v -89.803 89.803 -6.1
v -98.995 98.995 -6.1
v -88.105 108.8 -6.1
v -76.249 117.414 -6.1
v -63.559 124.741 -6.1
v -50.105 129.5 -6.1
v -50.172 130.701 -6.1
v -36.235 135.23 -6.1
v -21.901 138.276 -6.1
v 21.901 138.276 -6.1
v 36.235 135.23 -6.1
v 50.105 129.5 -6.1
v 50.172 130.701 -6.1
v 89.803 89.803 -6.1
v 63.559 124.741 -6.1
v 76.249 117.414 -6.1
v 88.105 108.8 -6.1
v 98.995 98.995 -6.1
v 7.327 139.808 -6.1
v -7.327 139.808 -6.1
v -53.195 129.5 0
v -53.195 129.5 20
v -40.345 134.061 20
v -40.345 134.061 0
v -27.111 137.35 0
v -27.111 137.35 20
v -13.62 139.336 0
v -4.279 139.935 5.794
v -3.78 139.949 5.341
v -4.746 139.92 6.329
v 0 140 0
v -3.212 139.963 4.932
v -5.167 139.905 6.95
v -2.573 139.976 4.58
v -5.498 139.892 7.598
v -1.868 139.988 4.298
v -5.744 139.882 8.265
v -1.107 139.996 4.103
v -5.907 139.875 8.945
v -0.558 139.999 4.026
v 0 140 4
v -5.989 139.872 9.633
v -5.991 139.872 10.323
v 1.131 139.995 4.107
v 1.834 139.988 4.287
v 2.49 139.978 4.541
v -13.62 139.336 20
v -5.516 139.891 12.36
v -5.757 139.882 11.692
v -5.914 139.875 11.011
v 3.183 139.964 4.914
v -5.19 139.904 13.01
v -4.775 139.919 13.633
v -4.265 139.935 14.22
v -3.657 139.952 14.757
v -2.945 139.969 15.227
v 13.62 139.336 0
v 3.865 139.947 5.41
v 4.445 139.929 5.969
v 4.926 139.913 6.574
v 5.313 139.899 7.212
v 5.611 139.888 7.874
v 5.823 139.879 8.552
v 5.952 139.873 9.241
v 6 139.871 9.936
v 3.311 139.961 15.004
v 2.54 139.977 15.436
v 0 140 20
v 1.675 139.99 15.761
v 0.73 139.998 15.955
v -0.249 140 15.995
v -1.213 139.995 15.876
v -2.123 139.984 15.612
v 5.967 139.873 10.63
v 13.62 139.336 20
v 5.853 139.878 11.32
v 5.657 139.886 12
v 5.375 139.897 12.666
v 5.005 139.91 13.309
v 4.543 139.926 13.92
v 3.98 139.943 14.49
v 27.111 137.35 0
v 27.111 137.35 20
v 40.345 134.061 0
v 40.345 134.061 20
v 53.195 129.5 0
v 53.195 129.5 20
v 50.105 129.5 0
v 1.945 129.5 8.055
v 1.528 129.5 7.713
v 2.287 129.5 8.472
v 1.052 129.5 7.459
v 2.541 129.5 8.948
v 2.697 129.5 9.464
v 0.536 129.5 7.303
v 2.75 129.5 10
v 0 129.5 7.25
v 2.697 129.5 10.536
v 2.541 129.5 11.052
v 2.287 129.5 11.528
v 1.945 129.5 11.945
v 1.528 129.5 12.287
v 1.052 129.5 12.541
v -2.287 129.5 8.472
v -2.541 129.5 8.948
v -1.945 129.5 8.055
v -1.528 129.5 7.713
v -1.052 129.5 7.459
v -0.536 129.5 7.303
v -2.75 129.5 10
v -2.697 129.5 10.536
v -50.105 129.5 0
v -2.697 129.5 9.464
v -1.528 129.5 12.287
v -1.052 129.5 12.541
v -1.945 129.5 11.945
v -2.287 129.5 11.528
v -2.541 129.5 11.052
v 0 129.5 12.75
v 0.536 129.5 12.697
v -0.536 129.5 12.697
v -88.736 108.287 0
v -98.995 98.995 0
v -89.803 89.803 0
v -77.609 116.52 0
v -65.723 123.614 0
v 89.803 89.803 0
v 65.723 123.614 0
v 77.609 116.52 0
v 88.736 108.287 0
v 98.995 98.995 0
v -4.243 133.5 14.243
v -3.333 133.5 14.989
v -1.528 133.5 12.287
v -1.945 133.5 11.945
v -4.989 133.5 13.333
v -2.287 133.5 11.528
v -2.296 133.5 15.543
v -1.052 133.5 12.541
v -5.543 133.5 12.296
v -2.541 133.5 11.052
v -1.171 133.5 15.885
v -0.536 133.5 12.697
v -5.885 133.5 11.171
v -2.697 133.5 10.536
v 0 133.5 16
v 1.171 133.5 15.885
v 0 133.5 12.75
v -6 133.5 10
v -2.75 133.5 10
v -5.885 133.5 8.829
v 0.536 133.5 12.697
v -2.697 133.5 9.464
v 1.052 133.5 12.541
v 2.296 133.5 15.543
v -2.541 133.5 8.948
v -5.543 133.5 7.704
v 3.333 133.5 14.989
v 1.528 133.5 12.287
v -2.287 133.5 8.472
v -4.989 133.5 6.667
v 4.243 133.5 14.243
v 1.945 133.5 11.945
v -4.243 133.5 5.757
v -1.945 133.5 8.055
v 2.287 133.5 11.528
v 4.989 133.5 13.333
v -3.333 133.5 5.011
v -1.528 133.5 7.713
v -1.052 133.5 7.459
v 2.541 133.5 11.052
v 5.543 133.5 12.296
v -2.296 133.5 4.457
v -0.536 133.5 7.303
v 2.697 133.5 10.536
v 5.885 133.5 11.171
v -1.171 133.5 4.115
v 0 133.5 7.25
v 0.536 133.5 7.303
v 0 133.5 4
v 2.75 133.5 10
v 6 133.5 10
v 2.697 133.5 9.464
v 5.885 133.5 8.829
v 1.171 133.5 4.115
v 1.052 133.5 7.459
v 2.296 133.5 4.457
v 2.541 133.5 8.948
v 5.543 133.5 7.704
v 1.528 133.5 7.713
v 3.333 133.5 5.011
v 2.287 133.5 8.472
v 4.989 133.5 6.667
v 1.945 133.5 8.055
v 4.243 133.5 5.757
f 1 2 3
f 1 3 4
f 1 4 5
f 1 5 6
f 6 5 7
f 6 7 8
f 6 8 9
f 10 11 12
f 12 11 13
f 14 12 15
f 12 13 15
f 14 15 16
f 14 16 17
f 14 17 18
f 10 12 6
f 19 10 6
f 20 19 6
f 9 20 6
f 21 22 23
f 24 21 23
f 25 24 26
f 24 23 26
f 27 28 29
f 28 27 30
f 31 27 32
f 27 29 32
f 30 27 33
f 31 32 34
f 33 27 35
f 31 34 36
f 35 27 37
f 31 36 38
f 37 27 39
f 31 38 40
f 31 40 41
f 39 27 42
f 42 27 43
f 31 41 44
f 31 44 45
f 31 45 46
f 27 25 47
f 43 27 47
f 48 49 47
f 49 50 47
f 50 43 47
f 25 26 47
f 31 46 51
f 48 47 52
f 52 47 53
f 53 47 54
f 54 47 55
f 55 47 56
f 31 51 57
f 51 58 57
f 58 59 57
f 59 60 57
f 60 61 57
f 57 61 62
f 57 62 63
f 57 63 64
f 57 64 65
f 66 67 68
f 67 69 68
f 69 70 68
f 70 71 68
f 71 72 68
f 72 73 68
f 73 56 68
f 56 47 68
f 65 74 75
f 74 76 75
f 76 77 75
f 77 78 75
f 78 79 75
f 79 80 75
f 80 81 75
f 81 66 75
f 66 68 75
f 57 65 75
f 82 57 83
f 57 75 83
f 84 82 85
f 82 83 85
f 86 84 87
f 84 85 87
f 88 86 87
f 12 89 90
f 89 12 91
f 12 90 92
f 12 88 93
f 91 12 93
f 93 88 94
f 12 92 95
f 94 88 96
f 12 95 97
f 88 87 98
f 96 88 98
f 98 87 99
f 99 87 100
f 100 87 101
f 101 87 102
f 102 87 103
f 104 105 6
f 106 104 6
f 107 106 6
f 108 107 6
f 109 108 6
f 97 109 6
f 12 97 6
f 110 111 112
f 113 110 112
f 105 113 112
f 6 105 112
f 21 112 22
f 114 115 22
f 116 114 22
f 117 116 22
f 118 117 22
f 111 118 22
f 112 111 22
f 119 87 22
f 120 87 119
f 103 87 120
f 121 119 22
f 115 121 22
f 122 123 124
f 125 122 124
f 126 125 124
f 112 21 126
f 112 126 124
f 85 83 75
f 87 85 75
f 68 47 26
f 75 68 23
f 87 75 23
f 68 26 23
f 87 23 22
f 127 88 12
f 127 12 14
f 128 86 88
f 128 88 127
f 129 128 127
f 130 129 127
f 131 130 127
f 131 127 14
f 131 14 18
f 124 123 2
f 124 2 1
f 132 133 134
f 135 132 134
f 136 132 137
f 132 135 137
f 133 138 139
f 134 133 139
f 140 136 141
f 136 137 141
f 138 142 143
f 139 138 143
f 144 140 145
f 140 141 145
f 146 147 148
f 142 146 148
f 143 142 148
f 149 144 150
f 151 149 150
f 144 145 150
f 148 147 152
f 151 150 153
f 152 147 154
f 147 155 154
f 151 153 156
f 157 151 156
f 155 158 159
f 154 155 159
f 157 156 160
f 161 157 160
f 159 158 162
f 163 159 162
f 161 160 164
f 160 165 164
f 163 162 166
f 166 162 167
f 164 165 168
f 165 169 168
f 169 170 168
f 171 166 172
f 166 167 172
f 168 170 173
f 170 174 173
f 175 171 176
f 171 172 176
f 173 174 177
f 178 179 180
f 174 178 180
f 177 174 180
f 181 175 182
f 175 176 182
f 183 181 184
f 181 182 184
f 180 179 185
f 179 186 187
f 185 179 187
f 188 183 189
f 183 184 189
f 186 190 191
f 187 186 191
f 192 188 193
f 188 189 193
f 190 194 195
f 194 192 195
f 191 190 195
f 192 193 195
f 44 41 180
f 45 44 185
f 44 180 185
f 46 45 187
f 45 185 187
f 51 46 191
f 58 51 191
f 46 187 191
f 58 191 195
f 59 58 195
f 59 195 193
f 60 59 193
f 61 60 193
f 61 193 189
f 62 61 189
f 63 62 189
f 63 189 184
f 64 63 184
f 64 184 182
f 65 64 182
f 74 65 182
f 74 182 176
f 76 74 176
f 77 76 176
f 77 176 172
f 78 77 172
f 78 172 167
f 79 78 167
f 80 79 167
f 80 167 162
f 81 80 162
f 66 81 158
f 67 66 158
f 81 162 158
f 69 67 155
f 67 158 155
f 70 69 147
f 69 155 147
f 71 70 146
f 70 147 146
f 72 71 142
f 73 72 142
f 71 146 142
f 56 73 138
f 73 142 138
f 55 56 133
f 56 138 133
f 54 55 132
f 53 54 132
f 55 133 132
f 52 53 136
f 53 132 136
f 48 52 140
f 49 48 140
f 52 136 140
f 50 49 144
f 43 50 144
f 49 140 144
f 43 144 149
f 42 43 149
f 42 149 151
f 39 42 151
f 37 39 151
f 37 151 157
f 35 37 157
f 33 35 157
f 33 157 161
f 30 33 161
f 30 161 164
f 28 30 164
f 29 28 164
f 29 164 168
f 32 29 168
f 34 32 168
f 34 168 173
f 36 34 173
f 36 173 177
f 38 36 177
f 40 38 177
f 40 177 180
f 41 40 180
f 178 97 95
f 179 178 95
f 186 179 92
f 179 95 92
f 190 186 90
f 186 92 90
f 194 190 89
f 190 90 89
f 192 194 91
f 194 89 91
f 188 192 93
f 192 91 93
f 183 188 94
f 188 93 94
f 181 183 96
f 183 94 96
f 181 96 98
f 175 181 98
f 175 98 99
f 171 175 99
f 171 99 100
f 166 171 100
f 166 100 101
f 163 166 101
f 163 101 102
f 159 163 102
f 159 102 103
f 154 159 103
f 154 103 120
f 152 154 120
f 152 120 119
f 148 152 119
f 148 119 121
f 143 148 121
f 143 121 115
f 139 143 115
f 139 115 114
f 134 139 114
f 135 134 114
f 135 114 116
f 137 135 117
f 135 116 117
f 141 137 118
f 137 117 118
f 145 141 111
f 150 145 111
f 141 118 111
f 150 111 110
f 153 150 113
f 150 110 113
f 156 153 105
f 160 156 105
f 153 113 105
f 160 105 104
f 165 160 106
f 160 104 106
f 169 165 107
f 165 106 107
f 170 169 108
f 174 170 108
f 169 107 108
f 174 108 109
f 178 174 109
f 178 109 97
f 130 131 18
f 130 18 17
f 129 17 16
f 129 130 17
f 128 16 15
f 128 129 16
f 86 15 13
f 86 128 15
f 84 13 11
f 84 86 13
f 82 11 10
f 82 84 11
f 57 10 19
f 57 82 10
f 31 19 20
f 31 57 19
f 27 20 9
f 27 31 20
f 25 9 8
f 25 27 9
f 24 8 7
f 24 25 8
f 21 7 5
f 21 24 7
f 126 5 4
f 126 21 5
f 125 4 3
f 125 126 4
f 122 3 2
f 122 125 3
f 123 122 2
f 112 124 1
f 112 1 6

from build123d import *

# Parameters (mm, degrees)
BOSS_EXTRUDE4_DEPTH = 6.1
BOSS_EXTRUDE5_START = 20
BOSS_EXTRUDE5_DEPTH = 20
SKETCH7_R           = 2.75
CUT_EXTRUDE1_DEPTH  = 109.516757445
SKETCH8_R           = 6
CUT_EXTRUDE2_DEPTH  = 20


with BuildPart() as part:
    # Sketch5 → Boss-Extrude4 (new body)
    with BuildSketch(Plane.XY):
        with BuildLine():
            Line((-89.802561211, 89.802561211), (-50.105122421, 129.5))
            Line((-50.105122421, 129.5), (50.105122421, 129.5))
            Line((50.105122421, 129.5), (89.802561211, 89.802561211))
            Line((89.802561211, 89.802561211), (98.994949366, 98.994949366))
            ThreePointArc((98.994949366, 98.994949366), (0, 140), (-98.994949366, 98.994949366))
            Line((-98.994949366, 98.994949366), (-89.802561211, 89.802561211))
        make_face()
    extrude(amount=-BOSS_EXTRUDE4_DEPTH)

    # Sketch6 → Boss-Extrude5 (add)
    with BuildSketch(Plane.XY.offset(BOSS_EXTRUDE5_START)):
        with BuildLine():
            Line((0, 129.5), (-53.195394538, 129.5))
            ThreePointArc((-53.195394538, 129.5), (0, 140), (53.195394538, 129.5))
            Line((53.195394538, 129.5), (0, 129.5))
        make_face()
    extrude(amount=-BOSS_EXTRUDE5_DEPTH)

    # Sketch7 → Cut-Extrude1 (cut, through all)
    with BuildSketch(Plane.XZ.offset(-129.5)):
        with Locations(Location((0, 10, 0), (0, 0, 270))):
            Circle(SKETCH7_R)
    extrude(amount=-CUT_EXTRUDE1_DEPTH, mode=Mode.SUBTRACT)

    # Sketch8 → Cut-Extrude2 (cut)
    with BuildSketch(Plane(origin=(0, 133.5, 0), x_dir=(-1, 0, 0), z_dir=(0, -1, 0))):
        with Locations(Location((0, -10, 0), (0, 0, 90))):
            Circle(SKETCH8_R)
    extrude(amount=-CUT_EXTRUDE2_DEPTH, mode=Mode.SUBTRACT)


solid = part.part
